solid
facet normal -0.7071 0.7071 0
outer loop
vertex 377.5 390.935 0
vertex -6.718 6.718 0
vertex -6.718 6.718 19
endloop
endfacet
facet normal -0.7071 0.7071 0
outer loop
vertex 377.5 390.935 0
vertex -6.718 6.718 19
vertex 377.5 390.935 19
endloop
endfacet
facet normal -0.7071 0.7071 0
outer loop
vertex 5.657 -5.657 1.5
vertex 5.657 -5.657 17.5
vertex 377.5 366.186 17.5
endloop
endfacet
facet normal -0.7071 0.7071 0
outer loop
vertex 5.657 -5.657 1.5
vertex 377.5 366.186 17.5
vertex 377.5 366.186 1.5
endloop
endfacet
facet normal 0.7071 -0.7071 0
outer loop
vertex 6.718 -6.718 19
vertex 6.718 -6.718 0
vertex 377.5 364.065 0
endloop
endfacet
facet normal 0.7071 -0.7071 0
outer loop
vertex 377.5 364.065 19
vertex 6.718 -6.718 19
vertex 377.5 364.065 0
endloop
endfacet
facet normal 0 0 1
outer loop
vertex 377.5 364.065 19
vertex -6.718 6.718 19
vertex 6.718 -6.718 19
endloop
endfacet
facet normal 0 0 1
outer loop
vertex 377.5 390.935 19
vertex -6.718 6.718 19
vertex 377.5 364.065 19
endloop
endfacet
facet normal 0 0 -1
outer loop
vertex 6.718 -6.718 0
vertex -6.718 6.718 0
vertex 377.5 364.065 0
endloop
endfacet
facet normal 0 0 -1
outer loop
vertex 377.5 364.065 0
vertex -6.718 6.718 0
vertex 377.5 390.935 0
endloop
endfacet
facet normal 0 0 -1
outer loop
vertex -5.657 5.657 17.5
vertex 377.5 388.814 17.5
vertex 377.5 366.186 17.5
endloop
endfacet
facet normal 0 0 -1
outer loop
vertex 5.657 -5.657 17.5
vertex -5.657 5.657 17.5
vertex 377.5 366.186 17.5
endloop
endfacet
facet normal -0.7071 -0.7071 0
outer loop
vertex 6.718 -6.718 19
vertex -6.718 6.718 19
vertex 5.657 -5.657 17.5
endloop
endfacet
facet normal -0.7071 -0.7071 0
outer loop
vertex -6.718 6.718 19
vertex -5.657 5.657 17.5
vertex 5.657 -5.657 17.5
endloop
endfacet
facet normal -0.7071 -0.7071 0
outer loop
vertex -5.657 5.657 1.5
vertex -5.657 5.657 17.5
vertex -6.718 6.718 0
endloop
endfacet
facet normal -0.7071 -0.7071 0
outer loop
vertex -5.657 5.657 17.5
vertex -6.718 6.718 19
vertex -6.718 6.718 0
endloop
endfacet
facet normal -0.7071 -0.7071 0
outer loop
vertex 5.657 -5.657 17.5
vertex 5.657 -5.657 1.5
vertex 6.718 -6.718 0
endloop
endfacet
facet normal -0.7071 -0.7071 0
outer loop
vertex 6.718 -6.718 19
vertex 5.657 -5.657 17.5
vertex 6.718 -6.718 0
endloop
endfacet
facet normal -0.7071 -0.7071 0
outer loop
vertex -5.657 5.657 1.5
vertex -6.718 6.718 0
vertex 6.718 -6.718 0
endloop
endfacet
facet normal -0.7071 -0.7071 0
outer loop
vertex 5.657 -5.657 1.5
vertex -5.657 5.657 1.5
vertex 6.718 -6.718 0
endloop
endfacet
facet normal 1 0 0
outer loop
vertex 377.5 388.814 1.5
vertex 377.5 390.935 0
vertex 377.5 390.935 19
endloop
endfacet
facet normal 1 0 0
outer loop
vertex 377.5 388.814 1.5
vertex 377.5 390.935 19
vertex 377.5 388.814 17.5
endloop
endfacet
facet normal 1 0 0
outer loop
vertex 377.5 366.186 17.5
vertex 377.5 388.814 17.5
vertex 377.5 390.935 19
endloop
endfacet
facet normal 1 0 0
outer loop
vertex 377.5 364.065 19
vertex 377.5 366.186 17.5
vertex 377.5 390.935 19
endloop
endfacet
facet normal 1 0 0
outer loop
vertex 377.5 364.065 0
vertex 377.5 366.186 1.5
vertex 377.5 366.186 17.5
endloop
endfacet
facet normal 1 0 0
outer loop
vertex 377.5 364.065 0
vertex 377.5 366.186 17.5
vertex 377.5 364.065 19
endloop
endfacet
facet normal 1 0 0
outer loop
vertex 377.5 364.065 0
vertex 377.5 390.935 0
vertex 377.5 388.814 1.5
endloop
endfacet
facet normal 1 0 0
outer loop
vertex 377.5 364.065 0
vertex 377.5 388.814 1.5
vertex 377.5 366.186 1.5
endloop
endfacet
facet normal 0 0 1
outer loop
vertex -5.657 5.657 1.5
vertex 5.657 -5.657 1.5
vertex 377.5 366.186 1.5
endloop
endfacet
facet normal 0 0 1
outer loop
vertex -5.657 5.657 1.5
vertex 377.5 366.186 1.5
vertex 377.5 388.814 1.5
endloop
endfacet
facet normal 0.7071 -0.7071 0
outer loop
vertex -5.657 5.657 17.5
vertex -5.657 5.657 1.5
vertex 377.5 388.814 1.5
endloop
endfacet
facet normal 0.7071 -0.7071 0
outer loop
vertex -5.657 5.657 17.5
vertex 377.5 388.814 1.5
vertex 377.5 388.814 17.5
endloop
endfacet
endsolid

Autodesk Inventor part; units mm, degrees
ref_plane "YZ Plane" through (0, 0, 0) normal (1, 0, 0) x (0, 1, 0)
ref_plane "XZ Plane" through (0, 0, 0) normal (0, 1, 0) x (-1, 0, 0)
ref_plane "XY Plane" through (0, 0, 0) normal (0, 0, 1) x (1, 0, 0)
sketch "Sketch2" plane through (0, 0, 0) normal (0, 0, 1) x (1, 0, 0)
  line L0 (0, 0) -> (377.5, 0) construction
  line L1 (377.5, 0) -> (377.5, 377.5) construction
  line L2 (0, 0) -> (377.5, 377.5) construction
  line L3 (-6.7175, 6.7175) -> (6.7175, -6.7175)
  line L4 (377.5, 390.935) -> (377.5, 364.065)
  line L5 (-6.7175, 6.7175) -> (377.5, 390.935)
  line L6 (6.7175, -6.7175) -> (377.5, 364.065)
  dimension "d4" = 377.5
  dimension "d5" = 377.5
  dimension "d6" = 19
  dimension "d7" = 90
  dimension "d13" = 45
extrude "Extrusion1" add sketch "Sketch2" along normal blind 19
sketch "Sketch3" plane through (6.7175, -6.7175, 19) normal (-0.7071, -0.7071, 0) x (-0.7071, 0.7071, 0)
  line L0 (19, 19) -> (0, 19) projected
  line L1 (0, 19) -> (0, 0) projected
  line L2 (19, 0) -> (0, 0) projected
  line L3 (19, 19) -> (19, 0) projected
  line L4 (17.5, 1.5) -> (1.5, 1.5)
  line L5 (1.5, 1.5) -> (1.5, 17.5)
  line L6 (1.5, 17.5) -> (17.5, 17.5)
  line L7 (17.5, 17.5) -> (17.5, 1.5)
  point P0 (9.5, 19)
  dimension "d14" = 1.5
extrude "Extrusion2" cut sketch "Sketch3" against normal through all contours L4 L5 L6 L7
properties part number "C004" material "Aluminum 6061"
